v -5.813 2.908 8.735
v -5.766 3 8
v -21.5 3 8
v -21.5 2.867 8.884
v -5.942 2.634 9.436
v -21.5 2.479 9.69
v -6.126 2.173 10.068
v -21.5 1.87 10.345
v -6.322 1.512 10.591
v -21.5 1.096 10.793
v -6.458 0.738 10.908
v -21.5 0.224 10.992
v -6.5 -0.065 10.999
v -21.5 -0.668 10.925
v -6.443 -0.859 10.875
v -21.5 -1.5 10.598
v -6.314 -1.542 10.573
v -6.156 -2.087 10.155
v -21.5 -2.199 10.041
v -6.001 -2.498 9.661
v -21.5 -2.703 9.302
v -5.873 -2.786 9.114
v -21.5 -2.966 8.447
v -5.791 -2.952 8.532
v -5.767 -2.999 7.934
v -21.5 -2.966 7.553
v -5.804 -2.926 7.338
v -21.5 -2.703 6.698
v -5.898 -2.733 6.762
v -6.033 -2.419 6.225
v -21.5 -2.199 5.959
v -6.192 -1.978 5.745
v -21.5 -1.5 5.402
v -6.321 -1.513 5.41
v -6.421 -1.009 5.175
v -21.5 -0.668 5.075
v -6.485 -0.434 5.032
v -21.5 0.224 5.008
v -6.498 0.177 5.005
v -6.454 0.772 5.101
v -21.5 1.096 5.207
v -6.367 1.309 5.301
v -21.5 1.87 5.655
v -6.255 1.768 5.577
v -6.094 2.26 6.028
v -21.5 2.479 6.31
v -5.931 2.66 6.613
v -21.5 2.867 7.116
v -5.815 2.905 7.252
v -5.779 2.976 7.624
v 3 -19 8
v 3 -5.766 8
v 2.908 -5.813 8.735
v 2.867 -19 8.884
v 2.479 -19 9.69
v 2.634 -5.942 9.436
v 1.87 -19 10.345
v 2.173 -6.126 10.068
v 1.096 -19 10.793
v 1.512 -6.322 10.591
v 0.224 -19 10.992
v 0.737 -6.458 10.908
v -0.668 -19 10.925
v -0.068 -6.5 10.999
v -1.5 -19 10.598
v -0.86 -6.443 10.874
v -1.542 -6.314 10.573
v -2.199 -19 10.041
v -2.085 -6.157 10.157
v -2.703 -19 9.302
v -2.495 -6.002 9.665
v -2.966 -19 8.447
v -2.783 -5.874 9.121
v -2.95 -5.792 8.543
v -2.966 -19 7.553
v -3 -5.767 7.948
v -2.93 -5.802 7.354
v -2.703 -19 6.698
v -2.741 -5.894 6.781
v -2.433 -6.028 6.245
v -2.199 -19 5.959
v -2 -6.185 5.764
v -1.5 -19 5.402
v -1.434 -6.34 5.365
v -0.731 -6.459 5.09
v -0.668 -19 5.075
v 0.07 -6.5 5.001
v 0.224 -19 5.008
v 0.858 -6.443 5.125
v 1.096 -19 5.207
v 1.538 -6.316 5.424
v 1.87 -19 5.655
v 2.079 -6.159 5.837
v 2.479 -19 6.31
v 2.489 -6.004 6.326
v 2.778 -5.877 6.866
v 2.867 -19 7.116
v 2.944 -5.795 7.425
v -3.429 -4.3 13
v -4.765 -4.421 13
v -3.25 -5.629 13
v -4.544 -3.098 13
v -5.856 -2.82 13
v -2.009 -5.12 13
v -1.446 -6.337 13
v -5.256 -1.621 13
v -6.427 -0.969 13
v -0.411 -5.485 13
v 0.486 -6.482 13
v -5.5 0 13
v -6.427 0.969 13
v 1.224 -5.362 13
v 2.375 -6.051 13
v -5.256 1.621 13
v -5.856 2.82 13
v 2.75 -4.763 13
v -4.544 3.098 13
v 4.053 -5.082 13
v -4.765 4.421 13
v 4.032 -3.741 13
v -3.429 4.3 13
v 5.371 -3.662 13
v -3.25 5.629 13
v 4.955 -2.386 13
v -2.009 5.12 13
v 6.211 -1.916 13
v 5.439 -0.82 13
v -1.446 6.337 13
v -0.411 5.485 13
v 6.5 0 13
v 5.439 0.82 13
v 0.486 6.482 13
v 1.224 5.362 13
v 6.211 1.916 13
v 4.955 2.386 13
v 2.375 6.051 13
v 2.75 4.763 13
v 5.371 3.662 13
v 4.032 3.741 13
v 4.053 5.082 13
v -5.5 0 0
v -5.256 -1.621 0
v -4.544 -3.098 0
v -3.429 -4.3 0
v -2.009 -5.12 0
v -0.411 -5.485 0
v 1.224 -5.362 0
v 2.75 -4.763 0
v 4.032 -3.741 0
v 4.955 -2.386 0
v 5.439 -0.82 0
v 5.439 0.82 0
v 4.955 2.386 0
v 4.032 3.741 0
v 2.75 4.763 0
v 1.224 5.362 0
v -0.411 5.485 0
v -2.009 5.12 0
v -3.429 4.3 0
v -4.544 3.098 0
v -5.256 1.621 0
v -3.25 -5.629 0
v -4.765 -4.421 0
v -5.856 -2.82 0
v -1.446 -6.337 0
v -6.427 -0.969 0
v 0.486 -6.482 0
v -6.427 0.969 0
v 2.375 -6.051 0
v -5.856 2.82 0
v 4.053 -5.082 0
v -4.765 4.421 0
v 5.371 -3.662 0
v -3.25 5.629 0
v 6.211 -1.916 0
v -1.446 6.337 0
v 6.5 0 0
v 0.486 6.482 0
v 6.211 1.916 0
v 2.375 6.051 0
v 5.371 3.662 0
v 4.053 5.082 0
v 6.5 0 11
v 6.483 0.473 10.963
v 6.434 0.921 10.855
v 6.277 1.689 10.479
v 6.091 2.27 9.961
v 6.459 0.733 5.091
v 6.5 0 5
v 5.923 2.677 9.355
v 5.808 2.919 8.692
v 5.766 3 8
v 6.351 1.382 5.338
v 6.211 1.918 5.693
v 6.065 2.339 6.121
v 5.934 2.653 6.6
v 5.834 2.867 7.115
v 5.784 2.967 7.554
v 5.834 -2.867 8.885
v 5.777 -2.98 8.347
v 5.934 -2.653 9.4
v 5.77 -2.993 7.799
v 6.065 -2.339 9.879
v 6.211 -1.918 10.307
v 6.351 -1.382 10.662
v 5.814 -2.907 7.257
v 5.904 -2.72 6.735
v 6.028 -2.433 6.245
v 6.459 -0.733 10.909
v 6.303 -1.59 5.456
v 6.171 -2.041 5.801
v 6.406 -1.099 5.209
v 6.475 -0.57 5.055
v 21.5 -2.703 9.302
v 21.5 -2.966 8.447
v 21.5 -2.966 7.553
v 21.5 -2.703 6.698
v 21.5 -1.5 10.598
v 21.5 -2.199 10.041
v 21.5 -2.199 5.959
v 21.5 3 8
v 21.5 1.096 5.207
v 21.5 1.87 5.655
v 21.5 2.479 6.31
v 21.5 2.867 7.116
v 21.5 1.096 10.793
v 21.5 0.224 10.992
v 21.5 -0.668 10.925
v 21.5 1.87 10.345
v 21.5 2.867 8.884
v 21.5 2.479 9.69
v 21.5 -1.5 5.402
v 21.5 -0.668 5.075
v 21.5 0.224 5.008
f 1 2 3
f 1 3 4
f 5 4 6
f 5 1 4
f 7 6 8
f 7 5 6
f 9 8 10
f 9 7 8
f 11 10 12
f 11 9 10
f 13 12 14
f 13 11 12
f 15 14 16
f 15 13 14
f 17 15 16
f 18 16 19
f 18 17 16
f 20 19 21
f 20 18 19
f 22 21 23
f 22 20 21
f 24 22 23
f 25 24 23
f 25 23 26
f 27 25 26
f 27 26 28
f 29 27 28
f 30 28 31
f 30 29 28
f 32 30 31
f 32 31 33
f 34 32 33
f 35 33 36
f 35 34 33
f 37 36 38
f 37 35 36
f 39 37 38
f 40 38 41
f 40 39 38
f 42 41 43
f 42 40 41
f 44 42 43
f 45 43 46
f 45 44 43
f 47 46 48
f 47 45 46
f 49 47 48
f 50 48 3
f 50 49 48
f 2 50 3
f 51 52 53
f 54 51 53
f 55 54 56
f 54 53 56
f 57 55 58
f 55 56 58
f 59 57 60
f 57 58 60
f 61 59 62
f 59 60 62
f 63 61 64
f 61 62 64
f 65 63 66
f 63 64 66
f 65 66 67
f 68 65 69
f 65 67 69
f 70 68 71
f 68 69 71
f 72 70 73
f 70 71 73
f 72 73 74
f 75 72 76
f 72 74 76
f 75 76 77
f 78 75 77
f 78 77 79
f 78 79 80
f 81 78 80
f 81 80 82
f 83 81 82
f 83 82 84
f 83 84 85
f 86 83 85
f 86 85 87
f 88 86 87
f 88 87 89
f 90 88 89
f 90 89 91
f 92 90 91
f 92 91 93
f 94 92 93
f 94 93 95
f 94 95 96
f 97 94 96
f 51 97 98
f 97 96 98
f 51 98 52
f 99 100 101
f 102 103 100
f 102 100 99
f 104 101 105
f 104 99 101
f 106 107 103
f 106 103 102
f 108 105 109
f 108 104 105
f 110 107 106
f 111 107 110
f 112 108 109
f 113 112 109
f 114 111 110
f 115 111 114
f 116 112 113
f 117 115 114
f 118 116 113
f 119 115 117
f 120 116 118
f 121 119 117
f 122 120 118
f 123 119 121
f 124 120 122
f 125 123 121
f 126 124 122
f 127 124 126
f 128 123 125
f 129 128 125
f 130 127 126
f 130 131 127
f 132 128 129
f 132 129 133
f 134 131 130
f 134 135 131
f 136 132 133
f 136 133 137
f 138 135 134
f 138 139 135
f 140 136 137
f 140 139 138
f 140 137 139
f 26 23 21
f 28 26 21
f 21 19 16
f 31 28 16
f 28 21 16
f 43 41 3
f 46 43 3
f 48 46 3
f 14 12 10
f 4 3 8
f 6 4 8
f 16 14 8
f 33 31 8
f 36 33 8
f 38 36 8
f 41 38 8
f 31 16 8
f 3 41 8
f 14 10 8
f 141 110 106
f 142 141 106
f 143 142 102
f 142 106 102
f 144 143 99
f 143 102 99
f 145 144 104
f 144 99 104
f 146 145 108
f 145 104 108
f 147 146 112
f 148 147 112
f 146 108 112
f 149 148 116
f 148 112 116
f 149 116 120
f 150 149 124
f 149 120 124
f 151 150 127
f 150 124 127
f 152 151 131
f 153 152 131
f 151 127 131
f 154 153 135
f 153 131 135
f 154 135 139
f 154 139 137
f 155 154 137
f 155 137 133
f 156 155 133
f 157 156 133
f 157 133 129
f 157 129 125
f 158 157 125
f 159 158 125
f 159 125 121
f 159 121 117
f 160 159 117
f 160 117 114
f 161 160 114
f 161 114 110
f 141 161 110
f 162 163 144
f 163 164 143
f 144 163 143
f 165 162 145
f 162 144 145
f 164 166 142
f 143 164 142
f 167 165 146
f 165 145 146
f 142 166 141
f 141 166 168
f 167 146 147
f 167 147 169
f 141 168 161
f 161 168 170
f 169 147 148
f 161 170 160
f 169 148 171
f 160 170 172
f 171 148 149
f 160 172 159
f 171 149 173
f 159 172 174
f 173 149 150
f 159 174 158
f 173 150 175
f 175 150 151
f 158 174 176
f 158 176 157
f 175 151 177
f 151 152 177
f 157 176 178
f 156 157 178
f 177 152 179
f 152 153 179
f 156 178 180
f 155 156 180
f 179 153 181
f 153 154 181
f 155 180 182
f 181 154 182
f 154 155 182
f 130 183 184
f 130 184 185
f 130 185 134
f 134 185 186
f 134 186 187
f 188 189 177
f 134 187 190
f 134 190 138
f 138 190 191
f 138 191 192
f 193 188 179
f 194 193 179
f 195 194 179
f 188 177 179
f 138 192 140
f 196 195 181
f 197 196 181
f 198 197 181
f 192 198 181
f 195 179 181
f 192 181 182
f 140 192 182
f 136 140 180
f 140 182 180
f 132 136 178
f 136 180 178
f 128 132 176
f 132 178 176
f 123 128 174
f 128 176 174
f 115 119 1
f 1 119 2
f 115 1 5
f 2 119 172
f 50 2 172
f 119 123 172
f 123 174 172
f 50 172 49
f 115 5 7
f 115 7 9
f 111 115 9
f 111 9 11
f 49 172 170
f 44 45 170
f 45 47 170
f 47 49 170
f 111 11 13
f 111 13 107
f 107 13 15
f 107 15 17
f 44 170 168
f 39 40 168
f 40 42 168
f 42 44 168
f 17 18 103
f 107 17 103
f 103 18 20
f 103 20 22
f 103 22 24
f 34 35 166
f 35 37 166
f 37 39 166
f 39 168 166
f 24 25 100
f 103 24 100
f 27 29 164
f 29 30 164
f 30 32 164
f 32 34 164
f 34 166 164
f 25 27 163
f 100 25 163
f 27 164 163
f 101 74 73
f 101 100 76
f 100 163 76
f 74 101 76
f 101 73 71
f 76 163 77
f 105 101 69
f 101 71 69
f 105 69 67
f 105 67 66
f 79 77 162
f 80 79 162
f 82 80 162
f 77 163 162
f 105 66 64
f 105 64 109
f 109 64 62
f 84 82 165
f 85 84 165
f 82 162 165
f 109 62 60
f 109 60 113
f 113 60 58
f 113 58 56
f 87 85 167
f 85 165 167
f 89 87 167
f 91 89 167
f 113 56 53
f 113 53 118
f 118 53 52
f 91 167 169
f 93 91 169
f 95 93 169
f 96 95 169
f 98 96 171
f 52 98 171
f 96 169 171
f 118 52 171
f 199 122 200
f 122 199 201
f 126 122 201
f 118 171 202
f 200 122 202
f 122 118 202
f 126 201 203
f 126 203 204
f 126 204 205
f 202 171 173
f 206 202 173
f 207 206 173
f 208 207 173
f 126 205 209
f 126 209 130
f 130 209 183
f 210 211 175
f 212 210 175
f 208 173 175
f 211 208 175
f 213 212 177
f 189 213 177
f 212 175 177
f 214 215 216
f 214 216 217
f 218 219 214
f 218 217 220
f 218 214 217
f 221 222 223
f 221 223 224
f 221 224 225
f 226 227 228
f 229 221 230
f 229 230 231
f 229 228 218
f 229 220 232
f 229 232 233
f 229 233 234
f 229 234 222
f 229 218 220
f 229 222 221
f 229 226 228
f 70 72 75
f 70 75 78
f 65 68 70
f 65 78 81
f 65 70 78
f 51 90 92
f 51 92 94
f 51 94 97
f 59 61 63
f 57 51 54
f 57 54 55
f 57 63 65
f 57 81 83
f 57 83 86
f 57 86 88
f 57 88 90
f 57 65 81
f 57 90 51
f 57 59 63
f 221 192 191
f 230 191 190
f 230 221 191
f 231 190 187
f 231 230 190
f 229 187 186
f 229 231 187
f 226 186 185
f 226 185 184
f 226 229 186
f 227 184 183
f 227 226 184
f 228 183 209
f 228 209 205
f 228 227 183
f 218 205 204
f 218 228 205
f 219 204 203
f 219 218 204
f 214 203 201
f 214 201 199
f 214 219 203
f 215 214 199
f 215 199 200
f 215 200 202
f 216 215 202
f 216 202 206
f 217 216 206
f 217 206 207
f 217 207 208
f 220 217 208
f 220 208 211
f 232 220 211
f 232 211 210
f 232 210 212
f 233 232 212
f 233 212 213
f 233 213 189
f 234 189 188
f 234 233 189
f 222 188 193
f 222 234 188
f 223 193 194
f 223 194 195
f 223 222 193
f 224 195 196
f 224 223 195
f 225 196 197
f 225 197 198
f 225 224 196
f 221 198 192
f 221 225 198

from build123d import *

# Parameters (mm, degrees)
F0_R     = 6.5
F1_DEPTH = 13
F2_R     = 3
F3_DEPTH = 21.5
F4_R     = 3
F5_DEPTH = 19
F7_D     = 11


with BuildPart() as f1:
    # F0 (on Top) → F1 (new body)
    with BuildSketch(Plane.XY):
        Circle(F0_R)
    extrude(amount=F1_DEPTH)

    # F2 (on Right) → F3 (join, symmetric)
    with BuildSketch(Plane.YZ):
        with Locations((0, 8)):
            Circle(F2_R)
    extrude(amount=F3_DEPTH, both=True)

    # F4 (on Front) → F5 (join)
    with BuildSketch(Plane.XZ):
        with Locations((0, 8)):
            Circle(F4_R)
    extrude(amount=F5_DEPTH)

    # F7 (through all)
    with Locations(Plane(origin=(0, 0, 0), x_dir=(1, 0, 0), z_dir=(0, 0, -1))):
        with Locations((0, 0)):
            Hole(F7_D / 2)


solid = f1.part
